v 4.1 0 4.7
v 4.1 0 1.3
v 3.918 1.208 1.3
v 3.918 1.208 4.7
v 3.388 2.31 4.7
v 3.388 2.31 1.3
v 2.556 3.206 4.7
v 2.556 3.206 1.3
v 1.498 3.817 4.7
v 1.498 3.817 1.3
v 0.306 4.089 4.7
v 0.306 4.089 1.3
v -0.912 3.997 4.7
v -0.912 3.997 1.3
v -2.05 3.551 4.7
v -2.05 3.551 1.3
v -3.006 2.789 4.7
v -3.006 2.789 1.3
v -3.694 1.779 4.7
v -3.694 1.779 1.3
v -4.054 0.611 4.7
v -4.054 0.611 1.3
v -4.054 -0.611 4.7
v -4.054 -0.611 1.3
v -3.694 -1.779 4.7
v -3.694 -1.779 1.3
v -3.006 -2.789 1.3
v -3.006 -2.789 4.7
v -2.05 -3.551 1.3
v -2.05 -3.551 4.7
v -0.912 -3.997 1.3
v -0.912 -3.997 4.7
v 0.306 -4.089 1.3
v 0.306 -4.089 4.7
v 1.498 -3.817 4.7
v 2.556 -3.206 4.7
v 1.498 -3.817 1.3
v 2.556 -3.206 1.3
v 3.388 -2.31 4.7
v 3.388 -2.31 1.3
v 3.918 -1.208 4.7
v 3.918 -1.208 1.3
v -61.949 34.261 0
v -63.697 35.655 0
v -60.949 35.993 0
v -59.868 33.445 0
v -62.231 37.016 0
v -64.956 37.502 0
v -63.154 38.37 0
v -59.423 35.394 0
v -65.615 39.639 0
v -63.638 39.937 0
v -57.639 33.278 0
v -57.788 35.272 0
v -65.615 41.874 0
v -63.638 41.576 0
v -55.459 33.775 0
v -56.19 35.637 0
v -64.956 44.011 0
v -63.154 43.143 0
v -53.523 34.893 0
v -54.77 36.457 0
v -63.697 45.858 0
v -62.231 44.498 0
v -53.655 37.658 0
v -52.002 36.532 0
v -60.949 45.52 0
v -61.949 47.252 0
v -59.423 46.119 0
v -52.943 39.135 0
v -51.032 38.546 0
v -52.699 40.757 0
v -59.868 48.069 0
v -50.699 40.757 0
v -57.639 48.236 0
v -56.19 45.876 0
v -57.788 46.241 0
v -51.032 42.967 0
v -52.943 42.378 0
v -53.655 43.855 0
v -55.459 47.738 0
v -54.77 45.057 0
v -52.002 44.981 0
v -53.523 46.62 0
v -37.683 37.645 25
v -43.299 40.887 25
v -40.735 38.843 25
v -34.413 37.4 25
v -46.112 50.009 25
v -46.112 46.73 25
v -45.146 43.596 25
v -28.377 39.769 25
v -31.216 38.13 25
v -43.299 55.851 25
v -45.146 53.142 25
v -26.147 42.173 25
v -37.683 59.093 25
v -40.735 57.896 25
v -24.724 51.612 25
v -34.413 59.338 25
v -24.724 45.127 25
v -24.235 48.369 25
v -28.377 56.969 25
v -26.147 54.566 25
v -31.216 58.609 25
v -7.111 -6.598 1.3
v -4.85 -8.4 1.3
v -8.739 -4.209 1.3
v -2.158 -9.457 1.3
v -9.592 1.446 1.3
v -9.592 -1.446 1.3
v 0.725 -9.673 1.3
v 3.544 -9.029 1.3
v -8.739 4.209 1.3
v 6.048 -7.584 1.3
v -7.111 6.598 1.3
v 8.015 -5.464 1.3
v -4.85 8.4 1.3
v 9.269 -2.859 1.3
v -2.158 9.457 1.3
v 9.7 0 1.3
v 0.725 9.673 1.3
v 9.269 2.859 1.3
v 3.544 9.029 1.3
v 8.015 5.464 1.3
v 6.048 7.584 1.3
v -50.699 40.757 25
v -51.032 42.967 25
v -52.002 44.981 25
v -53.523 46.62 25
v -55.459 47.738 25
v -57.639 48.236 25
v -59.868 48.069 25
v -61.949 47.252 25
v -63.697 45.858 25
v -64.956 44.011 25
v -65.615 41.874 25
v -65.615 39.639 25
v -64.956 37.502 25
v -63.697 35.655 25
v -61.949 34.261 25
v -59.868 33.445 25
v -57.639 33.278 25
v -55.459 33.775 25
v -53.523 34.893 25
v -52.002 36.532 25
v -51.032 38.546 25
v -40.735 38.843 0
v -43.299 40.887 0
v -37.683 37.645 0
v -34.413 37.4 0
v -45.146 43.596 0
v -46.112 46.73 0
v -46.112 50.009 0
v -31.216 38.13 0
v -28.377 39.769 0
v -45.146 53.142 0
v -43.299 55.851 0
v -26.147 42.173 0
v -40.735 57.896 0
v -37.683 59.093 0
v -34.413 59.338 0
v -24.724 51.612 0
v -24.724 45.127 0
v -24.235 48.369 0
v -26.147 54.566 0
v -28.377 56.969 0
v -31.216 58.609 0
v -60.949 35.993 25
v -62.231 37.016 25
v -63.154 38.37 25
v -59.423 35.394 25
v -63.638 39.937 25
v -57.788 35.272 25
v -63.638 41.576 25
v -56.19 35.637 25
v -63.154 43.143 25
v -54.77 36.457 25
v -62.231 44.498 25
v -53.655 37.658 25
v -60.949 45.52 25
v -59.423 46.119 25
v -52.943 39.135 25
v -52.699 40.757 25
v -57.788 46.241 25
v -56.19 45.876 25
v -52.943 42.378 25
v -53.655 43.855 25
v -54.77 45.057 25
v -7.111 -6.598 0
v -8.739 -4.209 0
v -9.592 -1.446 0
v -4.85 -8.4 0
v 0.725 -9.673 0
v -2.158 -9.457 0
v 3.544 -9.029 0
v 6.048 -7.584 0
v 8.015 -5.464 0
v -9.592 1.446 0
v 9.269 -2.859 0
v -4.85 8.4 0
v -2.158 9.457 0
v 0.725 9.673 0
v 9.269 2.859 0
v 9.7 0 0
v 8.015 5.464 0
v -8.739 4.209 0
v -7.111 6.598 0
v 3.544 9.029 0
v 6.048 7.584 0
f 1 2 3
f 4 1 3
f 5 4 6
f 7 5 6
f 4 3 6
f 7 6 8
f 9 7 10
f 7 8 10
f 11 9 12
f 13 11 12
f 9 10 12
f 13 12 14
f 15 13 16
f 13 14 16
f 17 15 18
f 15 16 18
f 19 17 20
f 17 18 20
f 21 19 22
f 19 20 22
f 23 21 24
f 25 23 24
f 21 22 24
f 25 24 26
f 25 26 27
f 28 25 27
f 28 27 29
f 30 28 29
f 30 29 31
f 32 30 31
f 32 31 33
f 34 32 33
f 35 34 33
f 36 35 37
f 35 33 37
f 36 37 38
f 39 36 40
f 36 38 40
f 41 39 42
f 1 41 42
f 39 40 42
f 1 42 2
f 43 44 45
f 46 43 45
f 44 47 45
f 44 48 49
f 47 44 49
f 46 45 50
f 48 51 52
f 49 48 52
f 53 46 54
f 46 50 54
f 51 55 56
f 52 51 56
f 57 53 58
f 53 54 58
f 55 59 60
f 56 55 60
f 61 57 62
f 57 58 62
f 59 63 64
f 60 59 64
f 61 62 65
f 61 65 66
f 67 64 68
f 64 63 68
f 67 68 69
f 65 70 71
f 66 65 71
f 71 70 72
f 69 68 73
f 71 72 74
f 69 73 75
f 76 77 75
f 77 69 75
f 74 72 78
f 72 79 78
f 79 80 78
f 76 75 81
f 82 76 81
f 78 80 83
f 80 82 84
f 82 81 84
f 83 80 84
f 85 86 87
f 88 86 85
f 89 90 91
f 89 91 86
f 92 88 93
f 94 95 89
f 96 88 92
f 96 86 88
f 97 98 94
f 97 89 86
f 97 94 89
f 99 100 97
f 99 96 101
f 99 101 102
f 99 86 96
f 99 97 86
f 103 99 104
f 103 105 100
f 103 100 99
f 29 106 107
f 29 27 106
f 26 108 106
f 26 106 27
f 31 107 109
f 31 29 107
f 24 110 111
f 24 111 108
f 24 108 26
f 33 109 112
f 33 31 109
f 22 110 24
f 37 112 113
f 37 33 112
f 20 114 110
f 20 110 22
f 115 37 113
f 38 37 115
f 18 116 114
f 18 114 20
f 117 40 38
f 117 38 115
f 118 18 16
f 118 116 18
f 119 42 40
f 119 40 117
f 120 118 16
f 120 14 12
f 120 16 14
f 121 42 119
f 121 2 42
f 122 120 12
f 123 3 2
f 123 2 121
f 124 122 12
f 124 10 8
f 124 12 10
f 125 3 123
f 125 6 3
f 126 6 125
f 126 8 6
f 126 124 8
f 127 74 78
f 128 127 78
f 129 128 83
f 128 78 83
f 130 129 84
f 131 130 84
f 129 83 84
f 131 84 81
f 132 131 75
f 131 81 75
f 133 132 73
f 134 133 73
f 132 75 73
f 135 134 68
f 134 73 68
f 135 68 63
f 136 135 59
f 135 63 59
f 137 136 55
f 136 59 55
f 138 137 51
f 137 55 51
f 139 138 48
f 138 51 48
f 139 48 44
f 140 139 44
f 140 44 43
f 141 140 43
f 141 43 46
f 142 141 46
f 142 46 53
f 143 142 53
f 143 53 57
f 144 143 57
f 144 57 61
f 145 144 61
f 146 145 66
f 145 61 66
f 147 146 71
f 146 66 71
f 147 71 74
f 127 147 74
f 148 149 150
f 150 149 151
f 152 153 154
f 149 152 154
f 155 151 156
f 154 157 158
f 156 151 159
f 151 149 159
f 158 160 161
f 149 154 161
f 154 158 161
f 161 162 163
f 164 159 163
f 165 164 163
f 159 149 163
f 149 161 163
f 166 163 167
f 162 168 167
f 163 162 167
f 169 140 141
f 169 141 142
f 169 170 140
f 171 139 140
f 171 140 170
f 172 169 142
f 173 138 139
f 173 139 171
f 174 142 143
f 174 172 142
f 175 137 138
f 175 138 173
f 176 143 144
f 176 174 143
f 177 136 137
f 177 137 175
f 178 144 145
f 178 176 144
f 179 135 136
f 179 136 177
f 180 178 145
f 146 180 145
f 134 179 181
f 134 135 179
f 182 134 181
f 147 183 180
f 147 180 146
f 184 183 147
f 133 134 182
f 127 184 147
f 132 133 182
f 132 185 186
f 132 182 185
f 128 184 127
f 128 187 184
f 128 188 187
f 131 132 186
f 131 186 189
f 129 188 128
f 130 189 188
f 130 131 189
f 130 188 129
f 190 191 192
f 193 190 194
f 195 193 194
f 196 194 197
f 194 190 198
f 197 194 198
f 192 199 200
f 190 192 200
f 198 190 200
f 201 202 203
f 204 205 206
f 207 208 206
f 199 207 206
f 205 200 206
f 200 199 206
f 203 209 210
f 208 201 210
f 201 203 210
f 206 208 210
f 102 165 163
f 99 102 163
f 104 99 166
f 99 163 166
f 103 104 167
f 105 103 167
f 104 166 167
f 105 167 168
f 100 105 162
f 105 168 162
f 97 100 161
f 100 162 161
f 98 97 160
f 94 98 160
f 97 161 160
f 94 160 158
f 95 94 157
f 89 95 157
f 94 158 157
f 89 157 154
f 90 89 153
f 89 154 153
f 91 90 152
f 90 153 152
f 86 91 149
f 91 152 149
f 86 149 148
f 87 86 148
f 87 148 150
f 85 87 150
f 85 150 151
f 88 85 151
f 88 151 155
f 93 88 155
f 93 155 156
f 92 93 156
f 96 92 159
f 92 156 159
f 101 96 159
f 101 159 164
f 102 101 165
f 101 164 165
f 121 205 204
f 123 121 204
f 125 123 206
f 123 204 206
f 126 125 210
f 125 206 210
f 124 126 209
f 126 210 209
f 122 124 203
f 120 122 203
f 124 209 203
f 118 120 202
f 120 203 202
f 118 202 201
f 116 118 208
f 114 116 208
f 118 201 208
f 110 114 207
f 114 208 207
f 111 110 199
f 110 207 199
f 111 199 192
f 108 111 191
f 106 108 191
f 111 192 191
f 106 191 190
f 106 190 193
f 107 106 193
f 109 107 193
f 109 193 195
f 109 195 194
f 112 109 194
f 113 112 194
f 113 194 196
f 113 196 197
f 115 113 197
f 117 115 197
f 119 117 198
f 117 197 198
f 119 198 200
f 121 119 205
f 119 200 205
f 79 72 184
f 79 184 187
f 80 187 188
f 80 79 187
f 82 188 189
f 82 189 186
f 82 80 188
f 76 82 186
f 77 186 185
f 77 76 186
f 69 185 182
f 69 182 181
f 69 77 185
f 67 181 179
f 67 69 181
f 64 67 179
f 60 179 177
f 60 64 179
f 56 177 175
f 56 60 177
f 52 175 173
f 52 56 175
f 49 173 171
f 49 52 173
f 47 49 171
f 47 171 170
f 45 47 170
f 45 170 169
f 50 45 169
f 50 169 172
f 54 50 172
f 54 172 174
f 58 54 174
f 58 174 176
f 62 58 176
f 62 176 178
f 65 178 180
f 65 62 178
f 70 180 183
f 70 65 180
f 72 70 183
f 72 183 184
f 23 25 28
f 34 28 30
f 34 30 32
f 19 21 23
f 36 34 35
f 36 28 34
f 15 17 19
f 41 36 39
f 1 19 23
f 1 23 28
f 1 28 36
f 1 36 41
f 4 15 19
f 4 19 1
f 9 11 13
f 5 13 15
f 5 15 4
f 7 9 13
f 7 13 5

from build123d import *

# Parameters (mm, degrees)
F0_R     = 9.7
F1_DEPTH = 1.3
F2_R     = 4.1
F3_DEPTH = 3.4
F4_R     = 7.5
F4_R_2   = 5.5
F5_DEPTH = 25
F4_R_3   = 11
F6_DEPTH = 25


with BuildPart() as f1:
    # F0 (on Top) → F1 (new body)
    with BuildSketch(Plane.XY):
        Circle(F0_R)
    extrude(amount=F1_DEPTH)

    # F2 (on face) → F3 (join)
    with BuildSketch(Plane.XY.offset(1.3)):
        Circle(F2_R)
    extrude(amount=F3_DEPTH)


with BuildPart() as f5:
    # F4 (on Top) → F5 (new body)
    with BuildSketch(Plane.XY):
        with Locations((-58.199015, 40.756579)):
            Circle(F4_R)
        with Locations((-58.199015, 40.756579)):
            Circle(F4_R_2, mode=Mode.SUBTRACT)
    extrude(amount=F5_DEPTH)


with BuildPart() as f6:
    # F4 (on Top) → F6 (new body)
    with BuildSketch(Plane.XY):
        with Locations((-35.2352, 48.369221)):
            Circle(F4_R_3)
    extrude(amount=F6_DEPTH)


solid = Compound([f1.part, f5.part, f6.part])
